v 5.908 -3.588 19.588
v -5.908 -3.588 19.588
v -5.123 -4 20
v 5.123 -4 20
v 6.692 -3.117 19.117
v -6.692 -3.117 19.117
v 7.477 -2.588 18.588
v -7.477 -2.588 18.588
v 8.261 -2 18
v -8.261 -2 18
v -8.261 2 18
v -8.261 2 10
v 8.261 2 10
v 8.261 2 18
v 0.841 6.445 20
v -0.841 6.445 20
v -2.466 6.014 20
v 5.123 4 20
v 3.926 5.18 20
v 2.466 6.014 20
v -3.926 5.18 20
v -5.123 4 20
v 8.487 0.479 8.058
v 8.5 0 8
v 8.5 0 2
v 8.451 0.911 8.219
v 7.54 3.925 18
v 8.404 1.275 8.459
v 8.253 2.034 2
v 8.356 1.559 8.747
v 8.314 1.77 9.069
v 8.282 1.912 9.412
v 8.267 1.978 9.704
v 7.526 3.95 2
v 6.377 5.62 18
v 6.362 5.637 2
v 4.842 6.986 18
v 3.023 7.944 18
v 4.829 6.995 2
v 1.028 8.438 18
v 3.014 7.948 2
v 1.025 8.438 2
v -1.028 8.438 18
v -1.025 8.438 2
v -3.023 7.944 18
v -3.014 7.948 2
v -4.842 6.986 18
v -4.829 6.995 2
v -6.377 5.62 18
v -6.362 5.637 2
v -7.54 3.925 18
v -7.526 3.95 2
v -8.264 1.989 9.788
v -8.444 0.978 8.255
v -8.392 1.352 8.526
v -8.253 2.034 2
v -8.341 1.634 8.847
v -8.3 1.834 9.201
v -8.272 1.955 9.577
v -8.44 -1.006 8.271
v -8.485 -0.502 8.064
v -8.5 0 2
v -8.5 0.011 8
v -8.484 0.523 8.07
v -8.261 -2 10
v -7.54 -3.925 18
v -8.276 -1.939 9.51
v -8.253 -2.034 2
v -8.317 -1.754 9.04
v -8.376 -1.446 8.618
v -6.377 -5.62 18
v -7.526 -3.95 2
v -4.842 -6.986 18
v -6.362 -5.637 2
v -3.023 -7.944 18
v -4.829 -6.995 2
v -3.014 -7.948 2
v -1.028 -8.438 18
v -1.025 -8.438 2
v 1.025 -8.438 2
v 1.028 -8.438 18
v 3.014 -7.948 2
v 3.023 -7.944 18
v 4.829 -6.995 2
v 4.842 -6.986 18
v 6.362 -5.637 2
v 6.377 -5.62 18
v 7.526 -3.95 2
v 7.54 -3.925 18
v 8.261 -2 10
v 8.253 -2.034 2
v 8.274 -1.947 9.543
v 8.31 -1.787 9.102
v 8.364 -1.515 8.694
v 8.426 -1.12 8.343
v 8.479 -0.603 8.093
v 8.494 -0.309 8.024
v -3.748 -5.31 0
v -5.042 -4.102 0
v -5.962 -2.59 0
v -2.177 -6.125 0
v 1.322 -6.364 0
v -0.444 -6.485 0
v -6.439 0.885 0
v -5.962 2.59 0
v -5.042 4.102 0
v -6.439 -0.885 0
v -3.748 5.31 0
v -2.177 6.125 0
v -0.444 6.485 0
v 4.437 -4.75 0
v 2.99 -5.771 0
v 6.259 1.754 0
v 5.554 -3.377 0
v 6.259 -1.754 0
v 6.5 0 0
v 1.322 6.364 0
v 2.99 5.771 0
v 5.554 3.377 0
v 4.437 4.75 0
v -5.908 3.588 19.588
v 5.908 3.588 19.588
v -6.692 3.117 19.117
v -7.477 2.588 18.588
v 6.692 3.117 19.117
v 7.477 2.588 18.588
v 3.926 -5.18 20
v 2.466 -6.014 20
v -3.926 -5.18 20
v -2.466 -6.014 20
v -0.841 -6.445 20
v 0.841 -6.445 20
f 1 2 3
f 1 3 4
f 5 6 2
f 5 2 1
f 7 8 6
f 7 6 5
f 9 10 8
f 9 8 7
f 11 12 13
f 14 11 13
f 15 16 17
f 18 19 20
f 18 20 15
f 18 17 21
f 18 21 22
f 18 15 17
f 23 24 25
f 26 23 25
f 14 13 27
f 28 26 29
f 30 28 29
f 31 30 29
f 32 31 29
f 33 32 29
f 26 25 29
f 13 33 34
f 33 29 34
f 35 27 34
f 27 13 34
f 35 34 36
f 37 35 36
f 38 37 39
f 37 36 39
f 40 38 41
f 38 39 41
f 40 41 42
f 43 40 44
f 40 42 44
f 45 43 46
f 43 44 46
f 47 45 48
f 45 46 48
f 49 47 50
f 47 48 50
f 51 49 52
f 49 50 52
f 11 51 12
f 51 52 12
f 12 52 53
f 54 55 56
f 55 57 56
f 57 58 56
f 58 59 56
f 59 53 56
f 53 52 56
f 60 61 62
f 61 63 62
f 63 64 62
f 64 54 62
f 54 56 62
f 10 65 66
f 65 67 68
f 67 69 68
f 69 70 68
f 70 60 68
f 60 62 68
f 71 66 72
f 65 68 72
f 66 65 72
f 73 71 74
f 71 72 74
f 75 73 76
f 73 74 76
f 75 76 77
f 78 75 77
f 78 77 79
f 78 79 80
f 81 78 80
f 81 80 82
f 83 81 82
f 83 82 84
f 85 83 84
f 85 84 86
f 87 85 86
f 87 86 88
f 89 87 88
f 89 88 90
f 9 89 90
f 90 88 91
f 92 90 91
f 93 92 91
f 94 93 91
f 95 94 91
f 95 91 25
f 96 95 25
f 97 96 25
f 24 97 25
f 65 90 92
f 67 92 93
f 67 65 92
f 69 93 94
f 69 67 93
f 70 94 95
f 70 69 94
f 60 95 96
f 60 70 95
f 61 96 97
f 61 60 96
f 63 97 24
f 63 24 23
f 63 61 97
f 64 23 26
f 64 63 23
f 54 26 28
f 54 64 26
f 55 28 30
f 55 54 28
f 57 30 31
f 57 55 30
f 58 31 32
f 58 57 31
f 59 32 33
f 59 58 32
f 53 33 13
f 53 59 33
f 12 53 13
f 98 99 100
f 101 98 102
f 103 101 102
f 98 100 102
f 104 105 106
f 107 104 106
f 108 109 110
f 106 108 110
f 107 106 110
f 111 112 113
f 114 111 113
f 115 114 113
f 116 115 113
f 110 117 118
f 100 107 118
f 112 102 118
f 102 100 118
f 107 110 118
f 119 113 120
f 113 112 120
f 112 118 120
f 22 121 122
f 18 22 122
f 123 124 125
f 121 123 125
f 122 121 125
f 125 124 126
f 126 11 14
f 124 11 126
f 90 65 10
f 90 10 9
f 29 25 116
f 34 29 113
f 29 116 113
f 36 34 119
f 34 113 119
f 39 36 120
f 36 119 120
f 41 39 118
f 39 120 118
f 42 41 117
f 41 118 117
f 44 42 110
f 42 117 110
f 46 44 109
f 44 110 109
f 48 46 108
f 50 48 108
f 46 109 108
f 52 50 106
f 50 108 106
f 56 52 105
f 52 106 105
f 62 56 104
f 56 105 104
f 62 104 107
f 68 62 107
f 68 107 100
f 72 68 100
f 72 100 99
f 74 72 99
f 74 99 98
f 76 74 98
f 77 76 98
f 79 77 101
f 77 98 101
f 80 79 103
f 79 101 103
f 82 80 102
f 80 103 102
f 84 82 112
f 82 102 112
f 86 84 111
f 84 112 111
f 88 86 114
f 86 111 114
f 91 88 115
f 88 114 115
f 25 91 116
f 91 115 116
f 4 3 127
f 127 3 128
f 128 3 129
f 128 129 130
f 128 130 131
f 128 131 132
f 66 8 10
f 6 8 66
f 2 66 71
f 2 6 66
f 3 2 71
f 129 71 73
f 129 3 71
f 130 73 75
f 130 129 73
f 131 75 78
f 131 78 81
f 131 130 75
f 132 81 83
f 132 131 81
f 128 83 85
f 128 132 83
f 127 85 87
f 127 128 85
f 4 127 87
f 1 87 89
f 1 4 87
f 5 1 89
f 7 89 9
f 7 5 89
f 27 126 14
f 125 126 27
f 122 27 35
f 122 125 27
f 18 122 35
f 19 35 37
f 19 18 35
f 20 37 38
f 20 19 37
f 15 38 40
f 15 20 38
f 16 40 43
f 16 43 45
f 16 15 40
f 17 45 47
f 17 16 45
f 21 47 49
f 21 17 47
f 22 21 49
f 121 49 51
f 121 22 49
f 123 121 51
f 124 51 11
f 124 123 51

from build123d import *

# Parameters (mm, degrees)
BOX_W                   = 20
BOX_H                   = 4
BOX_DEPTH               = 10
CYLINDER001_R           = 2
CYLINDER001_DEPTH       = 20
CYLINDER001_PITCH_ANGLE = 90
CYLINDER_R              = 8.5
CYLINDER_DEPTH          = 20
CHAMFER_SIZE            = 2


with BuildPart() as cube:
    # Box → Box (new body)
    with BuildSketch(Plane(origin=(-10, -2, 10), x_dir=(1, 0, 0), z_dir=(0, 0, 1))):
        with Locations((10, 2)):
            Rectangle(BOX_W, BOX_H)
    extrude(amount=BOX_DEPTH)


with BuildPart() as fusion:
    # Cylinder001 → Cylinder001 (new body)
    with BuildSketch(Plane.XY):
        Circle(CYLINDER001_R)
    extrude(amount=CYLINDER001_DEPTH)


with BuildPart() as fusion_1:
    # Cylinder001 pitch: moved
    add(fusion.part.rotate(Axis((0, 0, 0), (0, 1, 0)), CYLINDER001_PITCH_ANGLE))


with BuildPart() as fusion_2:
    # Cylinder001 placement: moved
    add(fusion_1.part.moved(Location((-10, 0, 10))))

    # Fusion: union Cube
    add(cube.part)


with BuildPart() as chamfer_body:
    # Cylinder → Cylinder (new body)
    with BuildSketch(Plane.XY):
        Circle(CYLINDER_R)
    extrude(amount=CYLINDER_DEPTH)

    # Cut: cut Fusion
    add(fusion_2.part, mode=Mode.SUBTRACT)

    # Chamfer
    chamfer_edges = [chamfer_body.edges().sort_by_distance(p)[0] for p in [
        (0, 8.5, 20),
        (0, -8.5, 20),
        (-8.5, 0, 0),
        (0, 2, 20),
        (0, -2, 20),
    ]]
    chamfer(chamfer_edges, length=CHAMFER_SIZE)


solid = chamfer_body.part
